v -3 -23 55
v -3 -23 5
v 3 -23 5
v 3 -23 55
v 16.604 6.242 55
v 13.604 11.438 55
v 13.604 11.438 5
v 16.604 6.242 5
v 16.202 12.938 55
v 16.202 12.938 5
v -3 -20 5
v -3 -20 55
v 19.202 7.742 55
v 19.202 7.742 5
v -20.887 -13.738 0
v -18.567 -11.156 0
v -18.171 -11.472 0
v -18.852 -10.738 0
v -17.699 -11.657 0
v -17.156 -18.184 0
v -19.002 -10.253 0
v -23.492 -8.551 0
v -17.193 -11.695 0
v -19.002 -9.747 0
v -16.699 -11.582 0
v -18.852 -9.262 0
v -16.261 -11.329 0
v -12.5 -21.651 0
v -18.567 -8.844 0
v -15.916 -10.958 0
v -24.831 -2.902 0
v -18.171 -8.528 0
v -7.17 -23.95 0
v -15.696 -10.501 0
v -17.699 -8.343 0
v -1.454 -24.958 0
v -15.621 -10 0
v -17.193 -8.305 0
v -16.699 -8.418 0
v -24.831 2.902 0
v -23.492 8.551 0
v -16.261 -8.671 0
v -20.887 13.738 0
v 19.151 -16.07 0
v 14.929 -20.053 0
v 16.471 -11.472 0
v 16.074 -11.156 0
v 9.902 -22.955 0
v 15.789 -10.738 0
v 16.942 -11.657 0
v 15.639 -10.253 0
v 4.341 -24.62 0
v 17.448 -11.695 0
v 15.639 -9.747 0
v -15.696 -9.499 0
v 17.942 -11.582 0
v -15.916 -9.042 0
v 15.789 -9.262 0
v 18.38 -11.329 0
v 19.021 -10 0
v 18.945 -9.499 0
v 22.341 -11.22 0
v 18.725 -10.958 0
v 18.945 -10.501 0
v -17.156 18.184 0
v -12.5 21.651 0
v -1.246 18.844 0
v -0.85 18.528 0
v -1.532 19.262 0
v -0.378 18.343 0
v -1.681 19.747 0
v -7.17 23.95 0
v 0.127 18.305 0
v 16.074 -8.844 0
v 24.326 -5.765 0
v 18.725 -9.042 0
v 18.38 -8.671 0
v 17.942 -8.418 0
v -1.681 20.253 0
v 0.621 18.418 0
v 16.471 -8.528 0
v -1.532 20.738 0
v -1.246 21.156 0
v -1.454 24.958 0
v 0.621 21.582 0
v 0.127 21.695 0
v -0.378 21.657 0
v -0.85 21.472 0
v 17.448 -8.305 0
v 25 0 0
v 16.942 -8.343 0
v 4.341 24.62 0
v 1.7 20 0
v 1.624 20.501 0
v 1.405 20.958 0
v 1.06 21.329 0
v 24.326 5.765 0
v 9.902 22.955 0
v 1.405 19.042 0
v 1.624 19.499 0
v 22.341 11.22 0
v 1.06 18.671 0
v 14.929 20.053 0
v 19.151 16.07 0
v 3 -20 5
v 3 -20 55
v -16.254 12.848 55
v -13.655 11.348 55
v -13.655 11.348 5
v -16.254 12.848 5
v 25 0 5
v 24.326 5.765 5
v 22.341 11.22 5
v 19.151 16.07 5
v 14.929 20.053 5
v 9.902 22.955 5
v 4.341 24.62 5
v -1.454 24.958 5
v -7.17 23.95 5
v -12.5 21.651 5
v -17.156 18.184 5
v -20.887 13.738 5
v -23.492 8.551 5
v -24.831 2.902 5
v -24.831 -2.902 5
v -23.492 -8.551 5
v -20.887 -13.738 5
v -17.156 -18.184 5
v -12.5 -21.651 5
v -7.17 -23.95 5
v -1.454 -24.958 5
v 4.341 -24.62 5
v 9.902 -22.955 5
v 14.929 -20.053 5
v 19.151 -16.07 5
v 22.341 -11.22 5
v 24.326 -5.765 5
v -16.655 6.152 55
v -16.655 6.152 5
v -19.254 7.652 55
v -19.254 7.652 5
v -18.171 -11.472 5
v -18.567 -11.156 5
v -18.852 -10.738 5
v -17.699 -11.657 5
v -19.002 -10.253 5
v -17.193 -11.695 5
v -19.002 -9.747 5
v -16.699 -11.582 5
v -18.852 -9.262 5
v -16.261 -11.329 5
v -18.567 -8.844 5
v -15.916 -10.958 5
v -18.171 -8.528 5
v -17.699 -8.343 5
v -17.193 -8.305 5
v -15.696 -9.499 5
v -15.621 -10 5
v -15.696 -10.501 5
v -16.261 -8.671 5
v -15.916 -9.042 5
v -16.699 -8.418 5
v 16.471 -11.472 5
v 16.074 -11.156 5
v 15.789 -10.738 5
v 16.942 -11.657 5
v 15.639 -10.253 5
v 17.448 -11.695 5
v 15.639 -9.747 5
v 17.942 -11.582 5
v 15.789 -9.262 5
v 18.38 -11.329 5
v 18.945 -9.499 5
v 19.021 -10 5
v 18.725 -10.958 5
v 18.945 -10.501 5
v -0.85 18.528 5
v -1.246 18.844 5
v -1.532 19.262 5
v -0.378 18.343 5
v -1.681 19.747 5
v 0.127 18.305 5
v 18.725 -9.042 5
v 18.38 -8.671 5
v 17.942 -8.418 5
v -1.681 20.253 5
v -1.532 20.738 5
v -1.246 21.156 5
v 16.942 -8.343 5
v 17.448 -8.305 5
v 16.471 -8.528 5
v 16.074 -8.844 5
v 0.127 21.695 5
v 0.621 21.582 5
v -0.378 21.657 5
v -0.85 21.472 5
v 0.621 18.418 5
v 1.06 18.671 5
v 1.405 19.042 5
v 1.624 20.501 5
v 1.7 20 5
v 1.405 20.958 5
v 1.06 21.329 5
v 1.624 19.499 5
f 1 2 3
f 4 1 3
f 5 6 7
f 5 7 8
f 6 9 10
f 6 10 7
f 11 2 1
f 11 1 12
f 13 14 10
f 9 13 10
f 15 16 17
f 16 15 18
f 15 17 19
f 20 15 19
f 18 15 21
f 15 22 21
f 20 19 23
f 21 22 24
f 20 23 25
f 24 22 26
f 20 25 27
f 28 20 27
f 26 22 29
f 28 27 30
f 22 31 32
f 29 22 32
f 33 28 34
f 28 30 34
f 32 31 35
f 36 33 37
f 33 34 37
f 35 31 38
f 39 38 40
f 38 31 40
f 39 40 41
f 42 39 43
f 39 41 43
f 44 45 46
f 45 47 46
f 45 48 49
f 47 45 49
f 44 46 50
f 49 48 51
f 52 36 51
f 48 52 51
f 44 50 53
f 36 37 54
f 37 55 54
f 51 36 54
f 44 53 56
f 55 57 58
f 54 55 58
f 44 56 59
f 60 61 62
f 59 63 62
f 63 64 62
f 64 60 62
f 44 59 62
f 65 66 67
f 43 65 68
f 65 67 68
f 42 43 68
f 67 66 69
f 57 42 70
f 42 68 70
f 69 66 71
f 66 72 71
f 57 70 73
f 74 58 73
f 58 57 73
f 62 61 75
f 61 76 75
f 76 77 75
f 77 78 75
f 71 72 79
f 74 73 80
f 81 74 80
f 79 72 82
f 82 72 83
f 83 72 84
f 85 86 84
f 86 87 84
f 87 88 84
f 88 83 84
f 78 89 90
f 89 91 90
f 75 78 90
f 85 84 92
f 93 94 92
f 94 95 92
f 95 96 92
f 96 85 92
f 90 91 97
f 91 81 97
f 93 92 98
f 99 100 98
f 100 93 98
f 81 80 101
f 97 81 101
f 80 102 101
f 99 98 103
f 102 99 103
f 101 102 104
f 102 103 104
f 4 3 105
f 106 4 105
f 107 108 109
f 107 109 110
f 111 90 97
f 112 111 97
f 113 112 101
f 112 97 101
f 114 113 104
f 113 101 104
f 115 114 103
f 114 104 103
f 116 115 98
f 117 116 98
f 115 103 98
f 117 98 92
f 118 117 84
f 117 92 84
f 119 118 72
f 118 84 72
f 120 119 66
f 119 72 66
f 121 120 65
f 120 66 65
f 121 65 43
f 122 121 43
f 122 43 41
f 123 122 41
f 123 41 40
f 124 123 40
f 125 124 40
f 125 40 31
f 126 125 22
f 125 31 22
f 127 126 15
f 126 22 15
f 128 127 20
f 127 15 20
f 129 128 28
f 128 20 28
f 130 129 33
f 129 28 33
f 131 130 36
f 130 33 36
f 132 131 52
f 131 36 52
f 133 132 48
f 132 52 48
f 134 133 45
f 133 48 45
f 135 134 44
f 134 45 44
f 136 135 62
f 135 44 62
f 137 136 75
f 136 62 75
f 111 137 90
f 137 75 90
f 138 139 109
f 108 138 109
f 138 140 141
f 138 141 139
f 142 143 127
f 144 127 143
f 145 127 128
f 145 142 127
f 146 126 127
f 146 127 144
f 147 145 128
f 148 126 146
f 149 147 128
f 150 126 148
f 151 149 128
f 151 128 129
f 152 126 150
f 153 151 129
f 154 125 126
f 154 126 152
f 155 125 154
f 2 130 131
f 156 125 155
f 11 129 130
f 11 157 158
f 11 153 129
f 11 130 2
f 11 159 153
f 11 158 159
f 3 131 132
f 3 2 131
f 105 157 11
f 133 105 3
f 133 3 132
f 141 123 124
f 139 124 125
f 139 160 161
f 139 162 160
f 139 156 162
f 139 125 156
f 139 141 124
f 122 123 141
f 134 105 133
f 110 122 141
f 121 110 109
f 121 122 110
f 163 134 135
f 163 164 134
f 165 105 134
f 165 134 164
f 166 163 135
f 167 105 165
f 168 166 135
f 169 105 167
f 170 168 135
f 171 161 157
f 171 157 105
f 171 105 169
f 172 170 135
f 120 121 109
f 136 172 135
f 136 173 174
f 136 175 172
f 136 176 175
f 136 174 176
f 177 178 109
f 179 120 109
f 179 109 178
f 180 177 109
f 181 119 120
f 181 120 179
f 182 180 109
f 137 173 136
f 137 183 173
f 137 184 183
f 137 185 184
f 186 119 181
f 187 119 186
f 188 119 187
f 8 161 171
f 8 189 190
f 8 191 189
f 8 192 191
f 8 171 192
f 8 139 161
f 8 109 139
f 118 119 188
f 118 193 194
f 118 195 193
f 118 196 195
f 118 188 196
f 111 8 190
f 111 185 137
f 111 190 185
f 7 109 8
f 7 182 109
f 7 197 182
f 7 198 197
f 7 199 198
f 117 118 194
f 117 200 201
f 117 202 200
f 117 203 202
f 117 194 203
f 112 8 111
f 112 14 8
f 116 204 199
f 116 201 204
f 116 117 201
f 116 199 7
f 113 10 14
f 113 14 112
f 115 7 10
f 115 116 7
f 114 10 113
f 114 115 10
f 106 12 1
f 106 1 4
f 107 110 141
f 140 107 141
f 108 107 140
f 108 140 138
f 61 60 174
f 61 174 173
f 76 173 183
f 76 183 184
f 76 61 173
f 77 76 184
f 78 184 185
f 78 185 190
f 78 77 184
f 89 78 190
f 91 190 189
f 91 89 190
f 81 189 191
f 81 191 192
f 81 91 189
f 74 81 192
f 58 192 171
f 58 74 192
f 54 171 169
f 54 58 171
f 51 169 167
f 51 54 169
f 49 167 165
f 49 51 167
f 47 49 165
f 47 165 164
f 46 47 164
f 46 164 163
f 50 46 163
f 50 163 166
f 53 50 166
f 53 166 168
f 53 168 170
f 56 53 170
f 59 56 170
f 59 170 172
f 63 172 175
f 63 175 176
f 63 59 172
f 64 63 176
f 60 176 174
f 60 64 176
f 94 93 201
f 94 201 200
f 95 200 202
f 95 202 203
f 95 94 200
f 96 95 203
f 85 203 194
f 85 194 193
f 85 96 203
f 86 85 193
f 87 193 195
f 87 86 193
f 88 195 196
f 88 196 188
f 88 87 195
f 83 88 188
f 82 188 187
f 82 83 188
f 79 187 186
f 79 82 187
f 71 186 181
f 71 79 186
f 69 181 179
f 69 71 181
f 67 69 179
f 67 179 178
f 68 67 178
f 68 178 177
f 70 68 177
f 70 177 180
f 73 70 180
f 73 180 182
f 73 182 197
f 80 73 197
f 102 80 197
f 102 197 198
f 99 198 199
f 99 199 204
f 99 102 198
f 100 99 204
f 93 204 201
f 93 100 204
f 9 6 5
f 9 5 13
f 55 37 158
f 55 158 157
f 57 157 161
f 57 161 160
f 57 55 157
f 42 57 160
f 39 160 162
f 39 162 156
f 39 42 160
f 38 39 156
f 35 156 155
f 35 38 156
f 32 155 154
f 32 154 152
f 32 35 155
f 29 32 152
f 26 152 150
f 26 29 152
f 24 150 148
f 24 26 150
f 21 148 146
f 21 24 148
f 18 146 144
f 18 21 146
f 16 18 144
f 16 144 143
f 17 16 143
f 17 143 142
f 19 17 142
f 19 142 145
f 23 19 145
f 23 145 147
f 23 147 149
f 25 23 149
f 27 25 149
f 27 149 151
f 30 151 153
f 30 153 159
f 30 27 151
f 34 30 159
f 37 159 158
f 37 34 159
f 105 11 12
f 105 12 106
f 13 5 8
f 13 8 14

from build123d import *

# Parameters (mm, degrees)
F0_R     = 25
F0_R_2   = 1.7
F1_DEPTH = 5
F3_W     = 6
F3_H     = 3
F4_DEPTH = 50


# Not quite as in the source:
# - a feature names something its author has since deleted; it is built from what else it names


with BuildPart() as f1:
    # F0 (on Top) → F1 (new body)
    with BuildSketch(Plane.XY):
        Circle(F0_R)
        with Locations((-17.3205080757, -10)):
            Circle(F0_R_2, mode=Mode.SUBTRACT)
        with Locations((17.3205080757, -10)):
            Circle(F0_R_2, mode=Mode.SUBTRACT)
        with Locations((0, 20)):
            Circle(F0_R_2, mode=Mode.SUBTRACT)
    extrude(amount=F1_DEPTH)

    # F3 (on face) → F4 (join)
    with BuildSketch(Plane.XY.offset(5)):
        Polygon((-16.6554445662, 6.1519237886), (-13.6554445662, 11.3480762114), (-16.2535207776, 12.8480762114), (-19.2535207776, 7.6519237886), align=None)
        Polygon((16.2017059222, 12.9378221735), (13.6036297108, 11.4378221735), (16.6036297108, 6.2416697508), (19.2017059222, 7.7416697508), align=None)
        with Locations((0, -21.5)):
            Rectangle(F3_W, F3_H)
    extrude(amount=F4_DEPTH)


solid = f1.part
